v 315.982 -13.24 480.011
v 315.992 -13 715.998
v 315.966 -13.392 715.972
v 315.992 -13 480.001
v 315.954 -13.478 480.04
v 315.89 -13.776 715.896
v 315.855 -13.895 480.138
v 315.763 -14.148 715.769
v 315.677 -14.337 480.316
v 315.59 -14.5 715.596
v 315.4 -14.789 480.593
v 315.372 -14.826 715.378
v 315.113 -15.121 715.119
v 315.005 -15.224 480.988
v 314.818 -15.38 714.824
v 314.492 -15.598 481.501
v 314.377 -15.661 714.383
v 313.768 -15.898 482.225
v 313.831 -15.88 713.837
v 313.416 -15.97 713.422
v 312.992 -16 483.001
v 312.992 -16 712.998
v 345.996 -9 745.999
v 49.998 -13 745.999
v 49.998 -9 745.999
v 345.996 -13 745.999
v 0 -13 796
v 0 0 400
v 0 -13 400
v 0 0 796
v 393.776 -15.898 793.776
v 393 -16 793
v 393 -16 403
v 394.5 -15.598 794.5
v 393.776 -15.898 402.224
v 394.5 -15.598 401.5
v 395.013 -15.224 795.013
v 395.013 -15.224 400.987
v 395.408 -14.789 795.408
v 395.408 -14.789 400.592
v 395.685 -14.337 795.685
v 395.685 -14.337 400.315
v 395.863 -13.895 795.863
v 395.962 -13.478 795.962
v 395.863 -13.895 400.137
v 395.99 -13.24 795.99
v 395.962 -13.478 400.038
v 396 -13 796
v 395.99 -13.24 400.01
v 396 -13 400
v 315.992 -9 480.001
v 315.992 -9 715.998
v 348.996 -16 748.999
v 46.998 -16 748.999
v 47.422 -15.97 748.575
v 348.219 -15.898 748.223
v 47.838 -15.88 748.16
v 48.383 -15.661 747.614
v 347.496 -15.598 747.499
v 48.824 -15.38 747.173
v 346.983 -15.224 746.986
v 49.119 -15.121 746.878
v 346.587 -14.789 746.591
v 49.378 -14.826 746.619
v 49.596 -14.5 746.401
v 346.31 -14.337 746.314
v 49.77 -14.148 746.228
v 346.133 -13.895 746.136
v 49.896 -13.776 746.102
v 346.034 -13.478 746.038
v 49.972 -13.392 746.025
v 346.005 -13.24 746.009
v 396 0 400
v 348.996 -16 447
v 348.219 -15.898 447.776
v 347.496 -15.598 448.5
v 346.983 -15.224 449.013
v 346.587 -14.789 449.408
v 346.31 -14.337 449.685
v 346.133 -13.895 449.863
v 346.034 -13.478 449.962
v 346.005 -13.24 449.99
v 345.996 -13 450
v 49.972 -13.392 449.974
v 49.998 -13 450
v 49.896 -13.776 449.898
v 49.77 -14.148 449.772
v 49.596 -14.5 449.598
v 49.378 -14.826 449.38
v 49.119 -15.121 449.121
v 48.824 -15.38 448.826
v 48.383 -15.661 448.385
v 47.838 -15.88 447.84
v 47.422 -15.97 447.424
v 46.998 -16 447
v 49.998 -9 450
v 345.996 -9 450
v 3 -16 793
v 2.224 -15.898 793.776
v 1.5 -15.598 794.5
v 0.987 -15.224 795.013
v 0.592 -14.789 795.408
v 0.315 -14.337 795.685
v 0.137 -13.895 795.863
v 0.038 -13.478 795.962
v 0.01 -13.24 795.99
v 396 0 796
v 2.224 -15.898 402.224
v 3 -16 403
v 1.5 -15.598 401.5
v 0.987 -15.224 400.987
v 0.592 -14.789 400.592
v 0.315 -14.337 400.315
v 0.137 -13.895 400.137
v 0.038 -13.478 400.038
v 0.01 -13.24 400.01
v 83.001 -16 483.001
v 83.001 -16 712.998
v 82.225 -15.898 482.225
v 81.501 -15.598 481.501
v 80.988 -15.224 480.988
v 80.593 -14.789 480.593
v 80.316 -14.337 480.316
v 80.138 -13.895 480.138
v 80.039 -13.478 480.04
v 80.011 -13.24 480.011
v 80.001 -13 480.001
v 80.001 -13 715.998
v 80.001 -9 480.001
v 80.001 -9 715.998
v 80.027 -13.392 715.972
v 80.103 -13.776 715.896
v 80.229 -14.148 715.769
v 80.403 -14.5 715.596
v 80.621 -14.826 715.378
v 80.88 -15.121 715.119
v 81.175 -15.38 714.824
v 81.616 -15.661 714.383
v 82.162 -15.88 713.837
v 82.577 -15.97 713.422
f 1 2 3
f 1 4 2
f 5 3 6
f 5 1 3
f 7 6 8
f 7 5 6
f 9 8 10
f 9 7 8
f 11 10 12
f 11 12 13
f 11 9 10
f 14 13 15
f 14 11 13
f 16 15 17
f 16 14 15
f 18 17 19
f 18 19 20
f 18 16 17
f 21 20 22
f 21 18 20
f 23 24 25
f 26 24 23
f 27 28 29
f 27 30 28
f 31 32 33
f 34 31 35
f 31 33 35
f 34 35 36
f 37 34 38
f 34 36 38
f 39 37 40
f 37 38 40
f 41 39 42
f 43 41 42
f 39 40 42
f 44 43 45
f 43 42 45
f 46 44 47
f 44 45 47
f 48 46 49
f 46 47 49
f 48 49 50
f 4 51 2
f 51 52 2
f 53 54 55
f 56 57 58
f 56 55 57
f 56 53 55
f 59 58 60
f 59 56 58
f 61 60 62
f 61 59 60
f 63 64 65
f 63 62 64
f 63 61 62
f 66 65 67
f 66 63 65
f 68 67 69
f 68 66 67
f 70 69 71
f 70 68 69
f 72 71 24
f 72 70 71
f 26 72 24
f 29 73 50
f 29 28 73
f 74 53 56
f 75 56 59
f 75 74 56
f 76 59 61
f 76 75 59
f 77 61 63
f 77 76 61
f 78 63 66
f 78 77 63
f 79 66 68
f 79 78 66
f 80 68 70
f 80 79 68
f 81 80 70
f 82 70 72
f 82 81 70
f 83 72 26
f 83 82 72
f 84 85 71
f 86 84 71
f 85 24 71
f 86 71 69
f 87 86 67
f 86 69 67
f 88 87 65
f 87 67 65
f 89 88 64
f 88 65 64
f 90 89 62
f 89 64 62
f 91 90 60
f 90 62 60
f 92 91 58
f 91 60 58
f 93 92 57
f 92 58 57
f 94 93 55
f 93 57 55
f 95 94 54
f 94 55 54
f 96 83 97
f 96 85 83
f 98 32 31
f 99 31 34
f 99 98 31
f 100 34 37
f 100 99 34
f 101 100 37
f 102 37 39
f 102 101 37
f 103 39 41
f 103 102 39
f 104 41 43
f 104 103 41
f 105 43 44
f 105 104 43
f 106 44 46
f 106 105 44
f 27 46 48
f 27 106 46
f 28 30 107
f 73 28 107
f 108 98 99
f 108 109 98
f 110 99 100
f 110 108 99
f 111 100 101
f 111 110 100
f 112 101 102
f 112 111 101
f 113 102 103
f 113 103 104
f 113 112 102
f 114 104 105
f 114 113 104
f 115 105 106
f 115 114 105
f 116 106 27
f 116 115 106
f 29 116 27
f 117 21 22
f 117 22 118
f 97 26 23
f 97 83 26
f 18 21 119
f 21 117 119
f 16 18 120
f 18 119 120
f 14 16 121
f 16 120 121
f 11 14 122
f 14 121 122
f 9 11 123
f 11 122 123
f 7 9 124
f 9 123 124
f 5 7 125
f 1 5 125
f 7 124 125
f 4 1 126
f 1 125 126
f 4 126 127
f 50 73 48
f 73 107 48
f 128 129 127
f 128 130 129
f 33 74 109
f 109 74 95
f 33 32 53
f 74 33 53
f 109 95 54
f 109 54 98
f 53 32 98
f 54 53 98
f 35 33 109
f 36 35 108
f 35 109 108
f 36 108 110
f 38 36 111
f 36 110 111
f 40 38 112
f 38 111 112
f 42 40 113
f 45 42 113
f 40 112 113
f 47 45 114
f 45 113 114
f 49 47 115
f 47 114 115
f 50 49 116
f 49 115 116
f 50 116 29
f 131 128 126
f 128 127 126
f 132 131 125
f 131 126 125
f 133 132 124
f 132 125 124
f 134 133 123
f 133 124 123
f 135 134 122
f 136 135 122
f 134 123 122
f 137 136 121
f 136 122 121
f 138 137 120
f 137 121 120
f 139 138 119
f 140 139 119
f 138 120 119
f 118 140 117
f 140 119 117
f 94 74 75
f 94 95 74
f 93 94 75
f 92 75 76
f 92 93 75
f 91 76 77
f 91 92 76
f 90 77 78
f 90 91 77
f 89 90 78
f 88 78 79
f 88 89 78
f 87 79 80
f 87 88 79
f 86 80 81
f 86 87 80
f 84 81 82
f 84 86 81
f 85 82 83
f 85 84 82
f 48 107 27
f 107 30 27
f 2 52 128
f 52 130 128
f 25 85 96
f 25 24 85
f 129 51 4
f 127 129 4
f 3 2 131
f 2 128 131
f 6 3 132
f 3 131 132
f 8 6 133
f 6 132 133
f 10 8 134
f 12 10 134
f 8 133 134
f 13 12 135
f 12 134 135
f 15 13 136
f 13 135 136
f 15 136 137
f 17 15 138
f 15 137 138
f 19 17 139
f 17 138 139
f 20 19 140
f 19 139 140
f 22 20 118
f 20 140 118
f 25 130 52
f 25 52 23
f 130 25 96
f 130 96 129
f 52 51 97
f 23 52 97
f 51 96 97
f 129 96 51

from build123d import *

# Parameters (mm, degrees)
F0_W      = 44.656470418
F0_H      = 33.8078811765
F1_DEPTH  = 16
F2_DEPTH  = 796
F3_DEPTH  = 196
F4_W      = 68.9578056335
F4_H      = 493.6993122101
F5_DEPTH  = 7
F6_DEPTH  = 9.7
F7_DEPTH  = 99.33
F8_DEPTH  = 99.33
F9_DEPTH  = 17.34
F10_DEPTH = 102.97
F11_W     = 35.2807044983
F11_H     = 492.0964837074
F12_DEPTH = 7
F13_DEPTH = 37.27
F14_DEPTH = 6.58
F15_DEPTH = 106.63
F16_DEPTH = 5.87
F17_DEPTH = 200
F18_DEPTH = 200
F19_DEPTH = 200
F20_DEPTH = 600
F21_DEPTH = 600
F22_DEPTH = 600
F23_DEPTH = 200
F24_DEPTH = 200
F25_DEPTH = 200
F26_R     = 3


with BuildPart() as f1:
    # F0 (on Front) → F1 (new body)
    with BuildSketch(Plane.XZ):
        with Locations((22.328235209, 16.9039405882)):
            Rectangle(F0_W, F0_H)
    extrude(amount=F1_DEPTH)

    # F2 (add): a face of the model
    f2_faces = [f1.faces().sort_by_distance(p)[0] for p in [
        (22.328235209, -8, 0),
    ]]
    extrude(f2_faces, amount=-F2_DEPTH)

    # F3 (add): a face of the model
    f3_faces = [f1.faces().sort_by_distance(p)[0] for p in [
        (0, -8, 398),
    ]]
    extrude(f3_faces, amount=-F3_DEPTH)

    # F4 (on face) → F5 (cut)
    with BuildSketch(Plane.XZ.offset(16)):
        with Locations((94.1769480705, 399.8196721077)):
            Rectangle(F4_W, F4_H)
    extrude(amount=-F5_DEPTH, mode=Mode.SUBTRACT)

    # F6 (cut): a face of the model
    f6_faces = [f1.faces().sort_by_distance(p)[0] for p in [
        (59.6980452538, -12.5, 399.8196721077),
    ]]
    extrude(f6_faces, amount=-F6_DEPTH, mode=Mode.SUBTRACT)

    # F7 (add): a face of the model
    f7_faces = [f1.faces().sort_by_distance(p)[0] for p in [
        (89.3269480705, -12.5, 646.6693282127),
    ]]
    extrude(f7_faces, amount=-F7_DEPTH)

    # F8 (cut): a face of the model
    f8_faces = [f1.faces().sort_by_distance(p)[0] for p in [
        (89.3269480705, -12.5, 646.6693282127),
    ]]
    extrude(f8_faces, amount=-F8_DEPTH, mode=Mode.SUBTRACT)

    # F9 (cut): a face of the model
    f9_faces = [f1.faces().sort_by_distance(p)[0] for p in [
        (128.6558508873, -12.5, 449.4846721077),
    ]]
    extrude(f9_faces, amount=-F9_DEPTH, mode=Mode.SUBTRACT)

    # F10 (cut): a face of the model
    f10_faces = [f1.faces().sort_by_distance(p)[0] for p in [
        (97.9969480705, -12.5, 152.9700160027),
    ]]
    extrude(f10_faces, amount=-F10_DEPTH, mode=Mode.SUBTRACT)

    # F11 (on face) → F12 (join)
    with BuildSketch(Plane.XZ.offset(9)):
        with Locations((91.7714834213, 432.6795041561)):
            Rectangle(F11_W, F11_H)
    extrude(amount=F12_DEPTH)

    # F13 (add): a face of the model
    f13_faces = [f1.faces().sort_by_distance(p)[0] for p in [
        (91.7714834213, -12.5, 678.7277460098),
    ]]
    extrude(f13_faces, amount=F13_DEPTH)

    # F14 (add): a face of the model
    f14_faces = [f1.faces().sort_by_distance(p)[0] for p in [
        (109.4118356705, -12.5, 451.3145041561),
    ]]
    extrude(f14_faces, amount=F14_DEPTH)

    # F15 (add): a face of the model
    f15_faces = [f1.faces().sort_by_distance(p)[0] for p in [
        (95.0614834213, -12.5, 186.6312623024),
    ]]
    extrude(f15_faces, amount=F15_DEPTH)

    # F16 (cut): a face of the model
    f16_faces = [f1.faces().sort_by_distance(p)[0] for p in [
        (74.1311311722, -12.5, 397.9995041561),
    ]]
    extrude(f16_faces, amount=-F16_DEPTH, mode=Mode.SUBTRACT)

    # F17 (add): a face of the model
    f17_faces = [f1.faces().sort_by_distance(p)[0] for p in [
        (196, -8, 398),
    ]]
    extrude(f17_faces, amount=F17_DEPTH)

    # F18 (cut): a face of the model
    f18_faces = [f1.faces().sort_by_distance(p)[0] for p in [
        (145.9958508873, -12.5, 397.9996721077),
    ]]
    extrude(f18_faces, amount=-F18_DEPTH, mode=Mode.SUBTRACT)

    # F19 (add): a face of the model
    f19_faces = [f1.faces().sort_by_distance(p)[0] for p in [
        (115.9918356705, -12.5, 397.9995041561),
    ]]
    extrude(f19_faces, amount=F19_DEPTH)

    # F20 (cut): a face of the model
    f20_faces = [f1.faces().sort_by_distance(p)[0] for p in [
        (197.9964834213, -12.5, 80.0012623024),
    ]]
    extrude(f20_faces, amount=-F20_DEPTH, mode=Mode.SUBTRACT)

    # F21 (add): a face of the model
    f21_faces = [f1.faces().sort_by_distance(p)[0] for p in [
        (197.9969480705, -12.5, 50.0000160027),
    ]]
    extrude(f21_faces, amount=F21_DEPTH)

    # F22 (cut): a face of the model
    f22_faces = [f1.faces().sort_by_distance(p)[0] for p in [
        (198, -8, 0),
    ]]
    extrude(f22_faces, amount=-F22_DEPTH, mode=Mode.SUBTRACT)

    # F23 (add): a face of the model
    f23_faces = [f1.faces().sort_by_distance(p)[0] for p in [
        (198, -8, 600),
    ]]
    extrude(f23_faces, amount=F23_DEPTH)

    # F24 (cut): a face of the model
    f24_faces = [f1.faces().sort_by_distance(p)[0] for p in [
        (197.9969480705, -12.5, 650.0000160027),
    ]]
    extrude(f24_faces, amount=-F24_DEPTH, mode=Mode.SUBTRACT)

    # F25 (add): a face of the model
    f25_faces = [f1.faces().sort_by_distance(p)[0] for p in [
        (197.9964834213, -12.5, 680.0012623024),
    ]]
    extrude(f25_faces, amount=F25_DEPTH)

    # F26
    f26_edges = [f1.edges().sort_by_distance(p)[0] for p in [
        (197.996483, -16, 480.001262),
        (80.001131, -16, 597.999504),
        (197.996483, -16, 715.997746),
        (315.991836, -16, 597.999504),
        (0, -16, 598),
        (198, -16, 400),
        (396, -16, 598),
        (198, -16, 796),
        (49.998045, -16, 597.999672),
        (197.996948, -16, 745.999328),
        (345.995851, -16, 597.999672),
        (197.996948, -16, 450.000016),
    ]]
    fillet(f26_edges, radius=F26_R)


solid = f1.part
